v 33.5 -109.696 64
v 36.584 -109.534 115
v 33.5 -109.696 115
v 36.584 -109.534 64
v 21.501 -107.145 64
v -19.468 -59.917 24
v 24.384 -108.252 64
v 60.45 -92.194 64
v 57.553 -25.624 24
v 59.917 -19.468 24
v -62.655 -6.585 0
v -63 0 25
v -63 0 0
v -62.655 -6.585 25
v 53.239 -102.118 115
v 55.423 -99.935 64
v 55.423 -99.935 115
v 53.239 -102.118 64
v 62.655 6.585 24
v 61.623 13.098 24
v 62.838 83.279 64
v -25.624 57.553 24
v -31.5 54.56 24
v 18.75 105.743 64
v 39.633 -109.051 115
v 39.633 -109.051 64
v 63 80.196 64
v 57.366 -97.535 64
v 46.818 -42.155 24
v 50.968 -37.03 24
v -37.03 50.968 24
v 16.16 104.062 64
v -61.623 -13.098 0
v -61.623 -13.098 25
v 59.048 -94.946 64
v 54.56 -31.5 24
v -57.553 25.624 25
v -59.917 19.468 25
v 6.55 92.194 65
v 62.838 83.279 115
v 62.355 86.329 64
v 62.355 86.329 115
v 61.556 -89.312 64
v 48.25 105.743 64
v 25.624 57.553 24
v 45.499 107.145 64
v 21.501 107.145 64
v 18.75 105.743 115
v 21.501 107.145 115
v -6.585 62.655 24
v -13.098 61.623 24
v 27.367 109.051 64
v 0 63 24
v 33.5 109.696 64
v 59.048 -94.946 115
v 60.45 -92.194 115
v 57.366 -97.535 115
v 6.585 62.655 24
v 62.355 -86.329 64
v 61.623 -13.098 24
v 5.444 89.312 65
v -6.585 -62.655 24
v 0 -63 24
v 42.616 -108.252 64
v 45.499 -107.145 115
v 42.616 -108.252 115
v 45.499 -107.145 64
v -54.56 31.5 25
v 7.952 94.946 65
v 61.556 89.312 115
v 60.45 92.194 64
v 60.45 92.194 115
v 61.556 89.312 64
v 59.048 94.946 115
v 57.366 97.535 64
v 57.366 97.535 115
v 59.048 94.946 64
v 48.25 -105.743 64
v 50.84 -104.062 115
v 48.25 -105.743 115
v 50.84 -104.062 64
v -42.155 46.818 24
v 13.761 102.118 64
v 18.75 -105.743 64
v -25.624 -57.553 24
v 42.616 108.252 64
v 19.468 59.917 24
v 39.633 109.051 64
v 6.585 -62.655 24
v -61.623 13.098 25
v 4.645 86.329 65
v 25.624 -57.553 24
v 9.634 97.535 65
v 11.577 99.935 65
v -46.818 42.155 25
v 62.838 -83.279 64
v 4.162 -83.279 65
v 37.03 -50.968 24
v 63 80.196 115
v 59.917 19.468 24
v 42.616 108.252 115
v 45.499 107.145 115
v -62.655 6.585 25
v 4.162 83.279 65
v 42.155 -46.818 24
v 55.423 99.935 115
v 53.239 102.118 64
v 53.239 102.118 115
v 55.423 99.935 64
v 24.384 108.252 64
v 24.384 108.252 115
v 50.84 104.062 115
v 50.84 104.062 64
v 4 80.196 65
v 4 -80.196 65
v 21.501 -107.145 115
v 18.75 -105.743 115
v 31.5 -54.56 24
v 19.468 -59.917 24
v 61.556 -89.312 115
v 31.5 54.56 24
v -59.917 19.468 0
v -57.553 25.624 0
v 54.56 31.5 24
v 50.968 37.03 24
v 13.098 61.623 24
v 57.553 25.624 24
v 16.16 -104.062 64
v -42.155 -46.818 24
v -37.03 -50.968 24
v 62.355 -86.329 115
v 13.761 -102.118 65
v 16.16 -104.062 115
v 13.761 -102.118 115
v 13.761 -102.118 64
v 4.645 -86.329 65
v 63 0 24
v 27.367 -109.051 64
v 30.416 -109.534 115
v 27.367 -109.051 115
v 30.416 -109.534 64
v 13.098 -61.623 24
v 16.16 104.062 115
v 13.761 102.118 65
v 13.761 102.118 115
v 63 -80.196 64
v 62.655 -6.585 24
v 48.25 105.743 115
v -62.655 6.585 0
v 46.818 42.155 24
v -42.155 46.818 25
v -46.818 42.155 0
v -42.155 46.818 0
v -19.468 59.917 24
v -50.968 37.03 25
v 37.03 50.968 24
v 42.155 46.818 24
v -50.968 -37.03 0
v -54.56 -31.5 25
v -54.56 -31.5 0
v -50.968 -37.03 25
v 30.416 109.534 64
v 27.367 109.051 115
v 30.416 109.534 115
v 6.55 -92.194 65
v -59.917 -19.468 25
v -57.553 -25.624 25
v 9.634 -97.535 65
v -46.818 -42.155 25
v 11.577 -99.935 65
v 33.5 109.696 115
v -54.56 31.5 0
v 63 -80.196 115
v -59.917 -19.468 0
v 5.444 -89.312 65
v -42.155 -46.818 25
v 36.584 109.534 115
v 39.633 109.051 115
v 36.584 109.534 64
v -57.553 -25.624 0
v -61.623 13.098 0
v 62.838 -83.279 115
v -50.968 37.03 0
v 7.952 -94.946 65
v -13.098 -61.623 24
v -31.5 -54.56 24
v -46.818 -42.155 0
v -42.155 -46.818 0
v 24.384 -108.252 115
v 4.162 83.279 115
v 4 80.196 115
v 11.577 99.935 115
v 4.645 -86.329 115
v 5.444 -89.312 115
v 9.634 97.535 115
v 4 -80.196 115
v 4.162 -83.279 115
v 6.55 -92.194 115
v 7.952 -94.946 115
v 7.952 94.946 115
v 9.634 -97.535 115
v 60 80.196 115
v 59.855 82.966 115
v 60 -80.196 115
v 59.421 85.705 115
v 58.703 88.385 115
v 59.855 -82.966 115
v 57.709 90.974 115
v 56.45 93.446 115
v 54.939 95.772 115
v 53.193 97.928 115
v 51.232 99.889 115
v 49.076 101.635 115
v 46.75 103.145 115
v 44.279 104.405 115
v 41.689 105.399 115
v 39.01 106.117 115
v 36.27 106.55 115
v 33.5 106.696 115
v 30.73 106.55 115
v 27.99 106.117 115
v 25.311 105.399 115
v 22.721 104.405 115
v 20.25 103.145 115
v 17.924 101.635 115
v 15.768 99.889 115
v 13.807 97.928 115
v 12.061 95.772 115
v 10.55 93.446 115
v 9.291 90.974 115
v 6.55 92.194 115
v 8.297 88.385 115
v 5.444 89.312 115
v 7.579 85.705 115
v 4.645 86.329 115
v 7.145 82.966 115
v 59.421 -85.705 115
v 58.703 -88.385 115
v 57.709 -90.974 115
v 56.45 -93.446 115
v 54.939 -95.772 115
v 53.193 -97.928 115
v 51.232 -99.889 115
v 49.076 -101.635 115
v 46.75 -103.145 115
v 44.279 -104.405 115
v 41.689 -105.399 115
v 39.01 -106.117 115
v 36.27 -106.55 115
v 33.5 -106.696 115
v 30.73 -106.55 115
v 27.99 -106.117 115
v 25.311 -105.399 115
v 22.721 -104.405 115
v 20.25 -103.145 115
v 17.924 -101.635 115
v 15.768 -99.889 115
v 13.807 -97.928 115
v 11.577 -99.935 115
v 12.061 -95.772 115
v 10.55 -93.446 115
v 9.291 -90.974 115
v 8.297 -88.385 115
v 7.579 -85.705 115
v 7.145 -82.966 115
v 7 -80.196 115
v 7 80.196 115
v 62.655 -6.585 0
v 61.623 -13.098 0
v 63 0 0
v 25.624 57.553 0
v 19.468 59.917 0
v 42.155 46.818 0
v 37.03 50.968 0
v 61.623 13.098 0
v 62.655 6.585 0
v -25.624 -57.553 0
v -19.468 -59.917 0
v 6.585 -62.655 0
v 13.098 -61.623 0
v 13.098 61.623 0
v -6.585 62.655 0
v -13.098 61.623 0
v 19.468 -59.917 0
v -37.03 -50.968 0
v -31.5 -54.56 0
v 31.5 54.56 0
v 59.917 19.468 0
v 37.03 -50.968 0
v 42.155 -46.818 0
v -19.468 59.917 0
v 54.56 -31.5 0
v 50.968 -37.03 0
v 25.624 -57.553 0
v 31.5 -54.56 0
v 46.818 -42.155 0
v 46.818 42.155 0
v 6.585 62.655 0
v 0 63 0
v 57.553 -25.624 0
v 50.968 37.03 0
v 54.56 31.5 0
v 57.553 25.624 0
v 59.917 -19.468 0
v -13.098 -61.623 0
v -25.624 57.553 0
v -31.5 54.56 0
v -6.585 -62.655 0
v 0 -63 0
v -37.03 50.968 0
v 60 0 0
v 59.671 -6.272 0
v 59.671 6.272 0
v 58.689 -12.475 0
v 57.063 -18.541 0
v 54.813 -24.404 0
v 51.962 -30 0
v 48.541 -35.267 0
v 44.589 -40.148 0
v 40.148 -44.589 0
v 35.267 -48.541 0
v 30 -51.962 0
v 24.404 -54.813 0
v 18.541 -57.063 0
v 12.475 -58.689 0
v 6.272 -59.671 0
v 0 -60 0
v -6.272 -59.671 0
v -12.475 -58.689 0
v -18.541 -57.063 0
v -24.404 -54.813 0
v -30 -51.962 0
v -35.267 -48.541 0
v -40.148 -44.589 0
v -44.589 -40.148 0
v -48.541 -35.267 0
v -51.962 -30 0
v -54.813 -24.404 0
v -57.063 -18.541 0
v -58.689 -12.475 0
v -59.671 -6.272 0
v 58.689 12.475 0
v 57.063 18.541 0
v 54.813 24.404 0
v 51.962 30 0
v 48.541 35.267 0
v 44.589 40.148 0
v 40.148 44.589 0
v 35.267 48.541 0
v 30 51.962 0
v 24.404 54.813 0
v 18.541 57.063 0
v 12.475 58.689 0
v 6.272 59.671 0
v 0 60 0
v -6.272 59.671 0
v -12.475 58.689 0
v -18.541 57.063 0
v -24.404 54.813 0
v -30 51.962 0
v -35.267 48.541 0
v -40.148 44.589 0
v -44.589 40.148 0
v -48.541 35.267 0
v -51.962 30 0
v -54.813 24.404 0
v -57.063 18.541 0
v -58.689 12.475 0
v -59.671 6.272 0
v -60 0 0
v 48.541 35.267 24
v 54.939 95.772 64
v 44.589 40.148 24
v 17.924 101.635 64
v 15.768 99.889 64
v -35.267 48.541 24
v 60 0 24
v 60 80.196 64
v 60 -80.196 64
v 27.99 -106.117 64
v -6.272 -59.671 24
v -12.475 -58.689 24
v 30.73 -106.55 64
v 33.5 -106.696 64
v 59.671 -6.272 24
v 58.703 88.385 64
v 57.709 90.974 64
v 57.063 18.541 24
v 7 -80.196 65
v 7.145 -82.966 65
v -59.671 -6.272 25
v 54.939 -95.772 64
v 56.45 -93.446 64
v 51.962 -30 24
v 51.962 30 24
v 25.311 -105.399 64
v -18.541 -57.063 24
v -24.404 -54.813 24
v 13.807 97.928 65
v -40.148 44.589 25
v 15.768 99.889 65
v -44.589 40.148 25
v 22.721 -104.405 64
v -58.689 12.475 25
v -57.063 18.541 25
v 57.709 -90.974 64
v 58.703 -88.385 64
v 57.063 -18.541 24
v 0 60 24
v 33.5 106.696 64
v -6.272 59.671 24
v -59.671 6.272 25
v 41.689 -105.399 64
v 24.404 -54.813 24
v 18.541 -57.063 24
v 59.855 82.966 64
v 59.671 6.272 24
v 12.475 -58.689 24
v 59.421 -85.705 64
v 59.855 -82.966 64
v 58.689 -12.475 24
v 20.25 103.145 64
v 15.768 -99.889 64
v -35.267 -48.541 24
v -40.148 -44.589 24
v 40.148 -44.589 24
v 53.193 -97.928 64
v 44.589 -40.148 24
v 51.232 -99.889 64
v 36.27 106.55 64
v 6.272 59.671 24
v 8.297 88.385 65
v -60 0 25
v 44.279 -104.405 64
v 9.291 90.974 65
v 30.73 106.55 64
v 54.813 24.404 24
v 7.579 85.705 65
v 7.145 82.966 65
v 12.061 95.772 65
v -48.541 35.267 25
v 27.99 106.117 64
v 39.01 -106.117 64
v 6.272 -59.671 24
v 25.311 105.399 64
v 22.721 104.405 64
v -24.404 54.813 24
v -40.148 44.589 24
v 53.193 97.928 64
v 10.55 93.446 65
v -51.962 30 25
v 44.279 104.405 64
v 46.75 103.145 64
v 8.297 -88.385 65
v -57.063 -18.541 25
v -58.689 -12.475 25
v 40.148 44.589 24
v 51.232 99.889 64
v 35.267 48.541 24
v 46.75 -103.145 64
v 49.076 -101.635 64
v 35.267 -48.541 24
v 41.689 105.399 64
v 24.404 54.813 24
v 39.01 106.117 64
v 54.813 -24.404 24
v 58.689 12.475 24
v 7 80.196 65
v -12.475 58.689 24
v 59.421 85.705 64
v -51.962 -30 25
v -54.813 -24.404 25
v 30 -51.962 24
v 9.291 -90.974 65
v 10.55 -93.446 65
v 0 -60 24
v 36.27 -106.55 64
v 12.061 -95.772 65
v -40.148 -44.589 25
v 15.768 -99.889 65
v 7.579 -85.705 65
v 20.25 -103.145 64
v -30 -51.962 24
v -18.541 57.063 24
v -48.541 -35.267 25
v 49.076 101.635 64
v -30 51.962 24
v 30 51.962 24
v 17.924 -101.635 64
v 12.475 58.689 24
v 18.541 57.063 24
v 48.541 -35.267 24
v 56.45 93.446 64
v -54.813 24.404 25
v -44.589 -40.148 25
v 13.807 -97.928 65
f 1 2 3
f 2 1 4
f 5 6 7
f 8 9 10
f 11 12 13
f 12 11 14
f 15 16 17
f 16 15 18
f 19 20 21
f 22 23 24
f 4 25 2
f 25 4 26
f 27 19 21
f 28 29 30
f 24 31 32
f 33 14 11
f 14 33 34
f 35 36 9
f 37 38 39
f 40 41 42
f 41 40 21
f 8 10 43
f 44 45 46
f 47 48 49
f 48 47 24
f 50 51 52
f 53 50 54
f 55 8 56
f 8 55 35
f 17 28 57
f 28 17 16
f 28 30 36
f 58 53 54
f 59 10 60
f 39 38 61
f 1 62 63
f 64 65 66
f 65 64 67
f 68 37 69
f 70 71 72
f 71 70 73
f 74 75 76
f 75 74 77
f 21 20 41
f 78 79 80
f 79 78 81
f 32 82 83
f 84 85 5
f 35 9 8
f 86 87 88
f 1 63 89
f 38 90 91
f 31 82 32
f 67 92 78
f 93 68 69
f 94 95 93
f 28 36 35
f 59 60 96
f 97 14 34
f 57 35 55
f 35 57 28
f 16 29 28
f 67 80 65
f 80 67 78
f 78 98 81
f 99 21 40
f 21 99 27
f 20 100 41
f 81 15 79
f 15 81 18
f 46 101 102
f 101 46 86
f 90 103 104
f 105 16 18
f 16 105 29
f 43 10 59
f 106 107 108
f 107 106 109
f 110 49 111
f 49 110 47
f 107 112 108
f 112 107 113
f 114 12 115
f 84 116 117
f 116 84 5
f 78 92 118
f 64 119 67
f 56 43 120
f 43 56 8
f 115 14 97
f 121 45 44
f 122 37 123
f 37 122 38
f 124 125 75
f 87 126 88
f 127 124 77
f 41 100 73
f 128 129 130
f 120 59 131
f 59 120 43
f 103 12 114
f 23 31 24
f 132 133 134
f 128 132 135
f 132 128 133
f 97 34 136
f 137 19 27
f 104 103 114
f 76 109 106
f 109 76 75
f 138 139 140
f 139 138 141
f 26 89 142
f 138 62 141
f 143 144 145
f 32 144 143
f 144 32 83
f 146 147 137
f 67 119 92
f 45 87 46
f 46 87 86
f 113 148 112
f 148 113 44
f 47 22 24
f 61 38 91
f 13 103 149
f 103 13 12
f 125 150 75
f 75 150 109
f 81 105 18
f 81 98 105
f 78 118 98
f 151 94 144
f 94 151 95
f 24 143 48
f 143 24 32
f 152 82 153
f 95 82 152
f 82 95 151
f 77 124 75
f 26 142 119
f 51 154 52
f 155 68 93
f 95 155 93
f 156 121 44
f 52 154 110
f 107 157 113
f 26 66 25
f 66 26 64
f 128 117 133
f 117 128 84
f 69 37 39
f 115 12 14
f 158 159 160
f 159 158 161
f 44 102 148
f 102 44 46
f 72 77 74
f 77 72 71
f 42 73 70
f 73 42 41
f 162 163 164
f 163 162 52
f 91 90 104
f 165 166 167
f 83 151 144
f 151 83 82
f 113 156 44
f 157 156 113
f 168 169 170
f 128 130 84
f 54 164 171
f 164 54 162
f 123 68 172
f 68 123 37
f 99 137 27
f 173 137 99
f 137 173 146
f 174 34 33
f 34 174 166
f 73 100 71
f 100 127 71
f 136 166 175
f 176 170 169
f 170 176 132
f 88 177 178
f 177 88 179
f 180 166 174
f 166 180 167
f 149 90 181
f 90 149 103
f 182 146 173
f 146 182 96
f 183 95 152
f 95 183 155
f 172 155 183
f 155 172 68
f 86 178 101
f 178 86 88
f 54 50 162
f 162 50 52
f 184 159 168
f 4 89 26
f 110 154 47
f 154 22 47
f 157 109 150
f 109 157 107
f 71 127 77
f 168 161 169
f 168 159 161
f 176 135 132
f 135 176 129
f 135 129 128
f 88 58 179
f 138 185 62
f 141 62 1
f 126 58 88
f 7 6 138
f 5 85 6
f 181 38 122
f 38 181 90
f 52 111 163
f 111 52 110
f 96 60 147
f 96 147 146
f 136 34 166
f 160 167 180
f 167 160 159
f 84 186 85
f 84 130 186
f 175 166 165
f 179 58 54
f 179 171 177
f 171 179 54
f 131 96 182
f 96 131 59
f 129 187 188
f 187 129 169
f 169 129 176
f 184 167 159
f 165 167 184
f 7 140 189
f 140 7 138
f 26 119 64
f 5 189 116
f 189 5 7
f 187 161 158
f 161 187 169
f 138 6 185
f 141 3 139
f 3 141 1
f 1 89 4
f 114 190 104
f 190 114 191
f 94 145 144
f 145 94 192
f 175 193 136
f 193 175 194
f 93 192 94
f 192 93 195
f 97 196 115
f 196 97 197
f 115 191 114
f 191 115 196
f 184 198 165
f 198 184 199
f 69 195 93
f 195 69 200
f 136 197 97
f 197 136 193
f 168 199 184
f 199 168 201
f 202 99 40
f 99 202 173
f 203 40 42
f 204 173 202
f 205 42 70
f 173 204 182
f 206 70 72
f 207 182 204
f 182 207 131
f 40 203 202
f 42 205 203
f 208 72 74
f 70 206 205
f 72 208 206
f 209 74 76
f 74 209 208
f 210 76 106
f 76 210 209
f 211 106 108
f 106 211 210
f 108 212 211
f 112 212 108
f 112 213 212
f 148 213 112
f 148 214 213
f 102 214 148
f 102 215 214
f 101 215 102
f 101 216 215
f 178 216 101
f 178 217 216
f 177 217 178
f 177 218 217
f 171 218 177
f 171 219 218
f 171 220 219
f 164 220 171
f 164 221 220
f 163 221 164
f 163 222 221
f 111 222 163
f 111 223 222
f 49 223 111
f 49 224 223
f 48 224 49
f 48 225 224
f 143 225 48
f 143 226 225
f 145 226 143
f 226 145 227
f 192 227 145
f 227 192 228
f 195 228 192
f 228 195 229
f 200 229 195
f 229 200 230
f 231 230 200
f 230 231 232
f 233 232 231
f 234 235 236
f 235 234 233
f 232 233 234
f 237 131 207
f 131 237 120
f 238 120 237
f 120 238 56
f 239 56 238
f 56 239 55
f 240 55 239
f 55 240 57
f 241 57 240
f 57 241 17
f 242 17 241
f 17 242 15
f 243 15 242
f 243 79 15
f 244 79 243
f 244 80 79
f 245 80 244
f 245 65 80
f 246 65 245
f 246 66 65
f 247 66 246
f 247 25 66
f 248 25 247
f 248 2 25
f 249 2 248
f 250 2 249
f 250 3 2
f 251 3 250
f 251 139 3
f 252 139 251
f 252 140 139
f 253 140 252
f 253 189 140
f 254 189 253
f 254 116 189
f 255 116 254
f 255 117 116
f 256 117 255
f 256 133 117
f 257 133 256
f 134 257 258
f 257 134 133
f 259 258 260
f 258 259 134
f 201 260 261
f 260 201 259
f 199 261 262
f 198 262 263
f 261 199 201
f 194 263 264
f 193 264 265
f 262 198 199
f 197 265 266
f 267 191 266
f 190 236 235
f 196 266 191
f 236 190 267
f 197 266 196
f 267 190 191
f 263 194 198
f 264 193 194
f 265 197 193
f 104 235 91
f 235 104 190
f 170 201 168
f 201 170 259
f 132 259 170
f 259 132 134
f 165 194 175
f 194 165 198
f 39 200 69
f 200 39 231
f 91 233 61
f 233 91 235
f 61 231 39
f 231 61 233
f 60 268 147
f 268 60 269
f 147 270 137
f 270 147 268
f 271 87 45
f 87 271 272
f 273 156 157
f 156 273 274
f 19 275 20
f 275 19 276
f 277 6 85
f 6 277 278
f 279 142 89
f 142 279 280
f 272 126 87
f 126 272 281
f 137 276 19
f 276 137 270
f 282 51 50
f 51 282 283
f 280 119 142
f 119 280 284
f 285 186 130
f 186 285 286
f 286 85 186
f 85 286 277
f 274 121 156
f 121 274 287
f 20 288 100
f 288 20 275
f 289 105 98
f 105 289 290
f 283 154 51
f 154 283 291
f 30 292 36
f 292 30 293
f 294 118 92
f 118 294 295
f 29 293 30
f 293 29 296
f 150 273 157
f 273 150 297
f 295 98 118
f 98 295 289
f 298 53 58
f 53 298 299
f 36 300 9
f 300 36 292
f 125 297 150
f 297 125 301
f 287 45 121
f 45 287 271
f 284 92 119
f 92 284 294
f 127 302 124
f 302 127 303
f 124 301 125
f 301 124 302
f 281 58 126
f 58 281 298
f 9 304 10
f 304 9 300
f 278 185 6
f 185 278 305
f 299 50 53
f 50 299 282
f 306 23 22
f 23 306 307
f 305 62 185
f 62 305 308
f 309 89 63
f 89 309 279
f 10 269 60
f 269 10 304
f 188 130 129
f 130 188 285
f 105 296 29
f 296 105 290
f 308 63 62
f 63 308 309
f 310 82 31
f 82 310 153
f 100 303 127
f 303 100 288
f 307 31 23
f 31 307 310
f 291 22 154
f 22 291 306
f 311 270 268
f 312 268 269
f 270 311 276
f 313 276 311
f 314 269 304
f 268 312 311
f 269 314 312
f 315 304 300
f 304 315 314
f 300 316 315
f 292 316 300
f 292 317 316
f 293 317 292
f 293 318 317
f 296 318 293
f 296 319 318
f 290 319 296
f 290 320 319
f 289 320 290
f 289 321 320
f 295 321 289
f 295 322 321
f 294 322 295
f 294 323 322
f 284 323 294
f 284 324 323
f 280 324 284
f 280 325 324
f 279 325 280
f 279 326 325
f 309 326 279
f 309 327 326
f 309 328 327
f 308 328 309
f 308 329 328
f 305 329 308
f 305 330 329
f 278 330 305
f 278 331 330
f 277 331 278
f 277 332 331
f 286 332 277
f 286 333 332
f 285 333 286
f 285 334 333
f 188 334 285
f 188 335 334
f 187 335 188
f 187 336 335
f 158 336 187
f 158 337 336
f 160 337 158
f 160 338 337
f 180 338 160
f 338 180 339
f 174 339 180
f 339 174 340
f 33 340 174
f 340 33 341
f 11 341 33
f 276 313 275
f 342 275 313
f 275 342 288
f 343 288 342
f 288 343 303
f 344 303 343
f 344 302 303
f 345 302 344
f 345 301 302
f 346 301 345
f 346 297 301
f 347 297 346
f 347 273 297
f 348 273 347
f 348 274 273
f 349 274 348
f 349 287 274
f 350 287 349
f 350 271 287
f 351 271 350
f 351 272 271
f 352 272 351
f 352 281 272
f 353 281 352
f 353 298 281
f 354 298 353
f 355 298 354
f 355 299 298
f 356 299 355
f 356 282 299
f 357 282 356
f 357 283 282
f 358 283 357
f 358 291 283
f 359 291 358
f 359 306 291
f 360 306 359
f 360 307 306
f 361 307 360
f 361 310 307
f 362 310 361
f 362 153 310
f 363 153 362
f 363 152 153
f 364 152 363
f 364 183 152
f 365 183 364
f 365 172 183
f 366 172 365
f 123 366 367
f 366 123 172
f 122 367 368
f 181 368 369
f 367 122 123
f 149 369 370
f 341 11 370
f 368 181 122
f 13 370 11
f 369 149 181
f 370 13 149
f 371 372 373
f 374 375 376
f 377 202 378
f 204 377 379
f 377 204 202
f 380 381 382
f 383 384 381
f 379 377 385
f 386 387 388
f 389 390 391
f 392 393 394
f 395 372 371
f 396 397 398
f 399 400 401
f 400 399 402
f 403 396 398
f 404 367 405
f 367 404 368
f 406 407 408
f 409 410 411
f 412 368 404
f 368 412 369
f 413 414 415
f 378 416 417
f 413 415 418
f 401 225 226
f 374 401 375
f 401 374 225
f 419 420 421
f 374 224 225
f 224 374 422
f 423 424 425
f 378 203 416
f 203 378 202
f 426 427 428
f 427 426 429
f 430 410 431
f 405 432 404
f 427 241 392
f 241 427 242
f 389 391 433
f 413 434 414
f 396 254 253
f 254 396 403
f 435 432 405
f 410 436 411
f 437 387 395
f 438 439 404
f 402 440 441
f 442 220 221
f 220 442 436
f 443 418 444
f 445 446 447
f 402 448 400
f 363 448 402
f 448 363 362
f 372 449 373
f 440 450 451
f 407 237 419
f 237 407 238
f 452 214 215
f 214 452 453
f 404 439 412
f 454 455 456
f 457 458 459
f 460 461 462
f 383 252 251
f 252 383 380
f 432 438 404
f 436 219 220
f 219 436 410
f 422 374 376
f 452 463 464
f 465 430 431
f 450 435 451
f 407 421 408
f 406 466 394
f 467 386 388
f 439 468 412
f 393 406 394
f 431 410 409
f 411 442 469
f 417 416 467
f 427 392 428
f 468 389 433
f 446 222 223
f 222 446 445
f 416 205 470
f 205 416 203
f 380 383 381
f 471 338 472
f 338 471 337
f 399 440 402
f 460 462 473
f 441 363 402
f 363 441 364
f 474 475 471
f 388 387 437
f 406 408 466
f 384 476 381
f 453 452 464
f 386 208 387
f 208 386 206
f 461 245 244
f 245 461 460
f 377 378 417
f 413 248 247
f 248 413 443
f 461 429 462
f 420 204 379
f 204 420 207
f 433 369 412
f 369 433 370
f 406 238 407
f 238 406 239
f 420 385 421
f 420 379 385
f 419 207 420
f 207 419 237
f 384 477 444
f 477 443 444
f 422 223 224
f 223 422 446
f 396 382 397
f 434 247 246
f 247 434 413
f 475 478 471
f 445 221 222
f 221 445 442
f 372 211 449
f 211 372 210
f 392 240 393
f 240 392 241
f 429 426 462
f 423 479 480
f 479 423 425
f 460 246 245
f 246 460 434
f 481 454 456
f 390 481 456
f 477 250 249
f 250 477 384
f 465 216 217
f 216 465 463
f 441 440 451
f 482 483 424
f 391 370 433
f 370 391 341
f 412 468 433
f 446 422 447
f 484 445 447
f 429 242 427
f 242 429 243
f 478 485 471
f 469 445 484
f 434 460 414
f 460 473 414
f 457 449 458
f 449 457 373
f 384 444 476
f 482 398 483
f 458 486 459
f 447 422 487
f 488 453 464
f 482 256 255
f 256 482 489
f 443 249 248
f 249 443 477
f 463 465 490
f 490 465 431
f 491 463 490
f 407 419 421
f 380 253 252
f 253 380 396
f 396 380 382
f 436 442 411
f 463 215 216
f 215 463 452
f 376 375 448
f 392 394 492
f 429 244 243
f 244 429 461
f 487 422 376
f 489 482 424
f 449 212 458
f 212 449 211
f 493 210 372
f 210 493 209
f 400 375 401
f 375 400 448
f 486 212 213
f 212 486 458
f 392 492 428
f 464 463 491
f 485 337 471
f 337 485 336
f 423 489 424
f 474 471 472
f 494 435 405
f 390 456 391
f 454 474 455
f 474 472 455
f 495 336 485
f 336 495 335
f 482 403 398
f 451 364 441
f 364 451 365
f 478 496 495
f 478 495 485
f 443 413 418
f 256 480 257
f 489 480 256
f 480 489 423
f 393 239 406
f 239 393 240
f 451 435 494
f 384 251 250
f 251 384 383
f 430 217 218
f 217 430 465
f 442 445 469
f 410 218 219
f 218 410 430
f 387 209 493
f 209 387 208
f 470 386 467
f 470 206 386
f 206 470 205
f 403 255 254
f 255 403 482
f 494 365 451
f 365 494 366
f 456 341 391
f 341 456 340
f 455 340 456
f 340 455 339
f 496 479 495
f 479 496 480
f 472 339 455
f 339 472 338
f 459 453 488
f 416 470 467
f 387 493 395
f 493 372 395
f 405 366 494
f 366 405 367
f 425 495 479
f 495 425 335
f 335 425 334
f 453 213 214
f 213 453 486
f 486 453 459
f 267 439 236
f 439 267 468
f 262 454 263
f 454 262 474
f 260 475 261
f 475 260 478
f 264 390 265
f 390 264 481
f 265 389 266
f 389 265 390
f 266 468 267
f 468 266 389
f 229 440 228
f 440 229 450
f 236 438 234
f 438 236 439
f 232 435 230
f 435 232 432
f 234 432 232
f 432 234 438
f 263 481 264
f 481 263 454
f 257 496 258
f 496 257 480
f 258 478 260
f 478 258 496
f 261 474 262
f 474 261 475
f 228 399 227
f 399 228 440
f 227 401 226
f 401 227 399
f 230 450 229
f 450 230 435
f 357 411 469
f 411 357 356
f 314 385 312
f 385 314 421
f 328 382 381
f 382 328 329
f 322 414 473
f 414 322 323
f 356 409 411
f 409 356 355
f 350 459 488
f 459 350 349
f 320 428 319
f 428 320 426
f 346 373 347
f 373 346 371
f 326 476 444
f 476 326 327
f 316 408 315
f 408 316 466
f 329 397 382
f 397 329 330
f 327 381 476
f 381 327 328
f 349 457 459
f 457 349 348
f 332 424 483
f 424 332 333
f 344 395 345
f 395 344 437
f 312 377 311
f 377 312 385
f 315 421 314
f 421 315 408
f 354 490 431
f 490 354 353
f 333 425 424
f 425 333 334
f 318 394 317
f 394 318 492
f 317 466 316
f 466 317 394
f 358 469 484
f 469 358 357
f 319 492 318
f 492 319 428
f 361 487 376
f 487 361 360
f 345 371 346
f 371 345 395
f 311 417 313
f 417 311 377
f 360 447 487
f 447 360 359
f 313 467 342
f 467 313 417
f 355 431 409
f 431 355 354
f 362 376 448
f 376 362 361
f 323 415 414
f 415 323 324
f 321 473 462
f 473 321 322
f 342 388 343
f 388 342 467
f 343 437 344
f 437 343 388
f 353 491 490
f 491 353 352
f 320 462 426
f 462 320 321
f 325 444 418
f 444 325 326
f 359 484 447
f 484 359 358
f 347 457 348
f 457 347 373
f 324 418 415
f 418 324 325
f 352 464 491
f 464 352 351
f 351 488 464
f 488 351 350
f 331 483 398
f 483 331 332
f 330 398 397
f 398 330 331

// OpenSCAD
$fn = 60;           // nauwkeurigheid van het tekenen van cirkels
wall = 3;           // dikte van de wand
dBuis = 120;        // doorsnede van de invoer buis
dOutlet = 53;       // dikte van de outlet
h1 = 40;            // hoogte van breede gedeelte toeter
h2 = 50;            // hoogte van smalle gedeelte toeter   
radius = 40;        // hoek die outlet moet maken rond kozijn
klemrand = 25;      // rand om slang in vast te klemmen



/////////// BEREKENDE WAARDEN ////////////////////
lOutlet = opp(dBuis) / dOutlet;
hoogte = klemrand + h1 + h2;
echo("breedte de buis", lOutlet + wall * 2);
echo("totale hoogte is", hoogte);

///////////// controleer de boel (een beetje) ///////////////////////////
assert(hoogte < 200, "maximale print hoogte is 20 cm");
echo("breedte van de duct", lOutlet + wall * 2);
assert(lOutlet + wall * 2 < 220, "maximale print breedte is 22 cm");
echo("raamopening is",  + dOutlet + wall * 2);
assert(dOutlet + wall * 2 < 60, "maximale raamopening is 6 cm");


translate([0, 0, h1 + klemrand]) {
    rotate([180, 0, 0]) {
        hollowToeter(dBuis = dBuis, h1 = h1, h2 = h2, dOutlet = dOutlet, lOutlet = lOutlet, klemrand = klemrand);
    }
}
//translate([0, 0, hoogte]) {
//    rotate([180, 0, 0]) {
//        versteviging();
//    }
//}


module versteviging() {
    intersection() {
        translate([0, 0, hoogte / 2 - klemrand]) {
            union() {
//                cube([wall, lOutlet, hoogte], center = true);
//                translate([dBuis - dOutlet, 0, 0] / 2)
//                    cube([wall, lOutlet, hoogte], center = true);
                cube([dBuis, wall, hoogte], center = true);
            }
        }
        translate([0, 0, h2]) {
            toeter( // binnen
                  dBuis = dBuis
                , h1 = h1 
                , h2 = h2
                , dOutlet = dOutlet
                , lOutlet = lOutlet
                , klemrand = klemrand);
        }
    }
}


module randje() {
    rotate([-90, 0, 0])
        linear_extrude(wall) {
            difference() {
                offset(r = 10) {
                    doorsnede();
                }
                doorsnede();
            }
        }
}

module doorsnede() {
    projection() {
        rotate([90, 0, 0]) {
            hollowToeter(dBuis = dBuis, h1 = h1, h2 = h2, dOutlet = dOutlet, lOutlet = lOutlet);
        }
    }

}



module hollowBocht(dBuis = 120, dOutlet = 40, radius = 40) {
    difference() {
        bocht(dBuis = dBuis, dOutlet = dOutlet, angle = 90, radius = radius);
        bocht(dBuis = dBuis - wall * 2, dOutlet = dOutlet - wall * 2, angle = 360, radius = radius + wall);
    }
}


module bocht(dBuis = 120, dOutlet = 40, angle = 90, radius = 40) {
    rotate_extrude(angle = angle, convexity = 20) {
        translate([dOutlet / 2 + radius, 0, 0]) {
            outletPlat(d = dBuis, b = dOutlet);
        }
    }
}

module hollowToeter(dBuis = 120, h1 = 50, h2 = 50, dOutlet = 40, lOutlet = 120, klemrand = 10) {
    difference() {
        toeter( // buiten
              dBuis = dBuis + wall * 2
            , h1 = h1
            , h2 = h2
            , dOutlet = dOutlet + 2 * wall
            , lOutlet = lOutlet + 2 * wall
            , klemrand = klemrand
        );
        toeter( // binnen
              dBuis = dBuis
            , h1 = h1 
            , h2 = h2 + wall
            , dOutlet = dOutlet
            , lOutlet = lOutlet
            , klemrand = klemrand + wall);
    }
}


module toeter(dBuis = 120, h1 = 50, h2 = 50, dOutlet = 40, lOutlet = 120, klemrand = 10) {
    translate = (dBuis - dOutlet) / 2;
    hull() {
        translate([translate, 0, 0]) { 
            outlet(lOutlet = lOutlet, dOutlet = dOutlet);
        }
        translate([0, 0, h1])
        cylinder (d = dBuis);
    }
    translate([translate, 0, -h2]) {
        outlet(lOutlet = lOutlet, dOutlet = dOutlet, h = h2);
    }
    translate([0, 0, h1]) {
        cylinder(d = dBuis, h = klemrand, center = false);
    }
}

module outlet(lOutlet = 120, dOutlet = 40, h = 1) {
    linear_extrude(height = h) {
        outletPlat(lOutlet = lOutlet, dOutlet = dOutlet);
    }
}

module outletPlat(lOutlet = 120, dOutlet = 40) {
    translate = (lOutlet - dOutlet) / 2;
    rotate([0, 0, 90]) {
        for(i = [-1,1]) {
            translate([translate * i, 0, 0]) {
                circle(d = dOutlet);
            }
        }
        translate([translate, dOutlet / 2, 0] * -1) {
            square([translate * 2, dOutlet]);
        }
    }

}


function opp(d = 10) = PI * d * d / 4;
